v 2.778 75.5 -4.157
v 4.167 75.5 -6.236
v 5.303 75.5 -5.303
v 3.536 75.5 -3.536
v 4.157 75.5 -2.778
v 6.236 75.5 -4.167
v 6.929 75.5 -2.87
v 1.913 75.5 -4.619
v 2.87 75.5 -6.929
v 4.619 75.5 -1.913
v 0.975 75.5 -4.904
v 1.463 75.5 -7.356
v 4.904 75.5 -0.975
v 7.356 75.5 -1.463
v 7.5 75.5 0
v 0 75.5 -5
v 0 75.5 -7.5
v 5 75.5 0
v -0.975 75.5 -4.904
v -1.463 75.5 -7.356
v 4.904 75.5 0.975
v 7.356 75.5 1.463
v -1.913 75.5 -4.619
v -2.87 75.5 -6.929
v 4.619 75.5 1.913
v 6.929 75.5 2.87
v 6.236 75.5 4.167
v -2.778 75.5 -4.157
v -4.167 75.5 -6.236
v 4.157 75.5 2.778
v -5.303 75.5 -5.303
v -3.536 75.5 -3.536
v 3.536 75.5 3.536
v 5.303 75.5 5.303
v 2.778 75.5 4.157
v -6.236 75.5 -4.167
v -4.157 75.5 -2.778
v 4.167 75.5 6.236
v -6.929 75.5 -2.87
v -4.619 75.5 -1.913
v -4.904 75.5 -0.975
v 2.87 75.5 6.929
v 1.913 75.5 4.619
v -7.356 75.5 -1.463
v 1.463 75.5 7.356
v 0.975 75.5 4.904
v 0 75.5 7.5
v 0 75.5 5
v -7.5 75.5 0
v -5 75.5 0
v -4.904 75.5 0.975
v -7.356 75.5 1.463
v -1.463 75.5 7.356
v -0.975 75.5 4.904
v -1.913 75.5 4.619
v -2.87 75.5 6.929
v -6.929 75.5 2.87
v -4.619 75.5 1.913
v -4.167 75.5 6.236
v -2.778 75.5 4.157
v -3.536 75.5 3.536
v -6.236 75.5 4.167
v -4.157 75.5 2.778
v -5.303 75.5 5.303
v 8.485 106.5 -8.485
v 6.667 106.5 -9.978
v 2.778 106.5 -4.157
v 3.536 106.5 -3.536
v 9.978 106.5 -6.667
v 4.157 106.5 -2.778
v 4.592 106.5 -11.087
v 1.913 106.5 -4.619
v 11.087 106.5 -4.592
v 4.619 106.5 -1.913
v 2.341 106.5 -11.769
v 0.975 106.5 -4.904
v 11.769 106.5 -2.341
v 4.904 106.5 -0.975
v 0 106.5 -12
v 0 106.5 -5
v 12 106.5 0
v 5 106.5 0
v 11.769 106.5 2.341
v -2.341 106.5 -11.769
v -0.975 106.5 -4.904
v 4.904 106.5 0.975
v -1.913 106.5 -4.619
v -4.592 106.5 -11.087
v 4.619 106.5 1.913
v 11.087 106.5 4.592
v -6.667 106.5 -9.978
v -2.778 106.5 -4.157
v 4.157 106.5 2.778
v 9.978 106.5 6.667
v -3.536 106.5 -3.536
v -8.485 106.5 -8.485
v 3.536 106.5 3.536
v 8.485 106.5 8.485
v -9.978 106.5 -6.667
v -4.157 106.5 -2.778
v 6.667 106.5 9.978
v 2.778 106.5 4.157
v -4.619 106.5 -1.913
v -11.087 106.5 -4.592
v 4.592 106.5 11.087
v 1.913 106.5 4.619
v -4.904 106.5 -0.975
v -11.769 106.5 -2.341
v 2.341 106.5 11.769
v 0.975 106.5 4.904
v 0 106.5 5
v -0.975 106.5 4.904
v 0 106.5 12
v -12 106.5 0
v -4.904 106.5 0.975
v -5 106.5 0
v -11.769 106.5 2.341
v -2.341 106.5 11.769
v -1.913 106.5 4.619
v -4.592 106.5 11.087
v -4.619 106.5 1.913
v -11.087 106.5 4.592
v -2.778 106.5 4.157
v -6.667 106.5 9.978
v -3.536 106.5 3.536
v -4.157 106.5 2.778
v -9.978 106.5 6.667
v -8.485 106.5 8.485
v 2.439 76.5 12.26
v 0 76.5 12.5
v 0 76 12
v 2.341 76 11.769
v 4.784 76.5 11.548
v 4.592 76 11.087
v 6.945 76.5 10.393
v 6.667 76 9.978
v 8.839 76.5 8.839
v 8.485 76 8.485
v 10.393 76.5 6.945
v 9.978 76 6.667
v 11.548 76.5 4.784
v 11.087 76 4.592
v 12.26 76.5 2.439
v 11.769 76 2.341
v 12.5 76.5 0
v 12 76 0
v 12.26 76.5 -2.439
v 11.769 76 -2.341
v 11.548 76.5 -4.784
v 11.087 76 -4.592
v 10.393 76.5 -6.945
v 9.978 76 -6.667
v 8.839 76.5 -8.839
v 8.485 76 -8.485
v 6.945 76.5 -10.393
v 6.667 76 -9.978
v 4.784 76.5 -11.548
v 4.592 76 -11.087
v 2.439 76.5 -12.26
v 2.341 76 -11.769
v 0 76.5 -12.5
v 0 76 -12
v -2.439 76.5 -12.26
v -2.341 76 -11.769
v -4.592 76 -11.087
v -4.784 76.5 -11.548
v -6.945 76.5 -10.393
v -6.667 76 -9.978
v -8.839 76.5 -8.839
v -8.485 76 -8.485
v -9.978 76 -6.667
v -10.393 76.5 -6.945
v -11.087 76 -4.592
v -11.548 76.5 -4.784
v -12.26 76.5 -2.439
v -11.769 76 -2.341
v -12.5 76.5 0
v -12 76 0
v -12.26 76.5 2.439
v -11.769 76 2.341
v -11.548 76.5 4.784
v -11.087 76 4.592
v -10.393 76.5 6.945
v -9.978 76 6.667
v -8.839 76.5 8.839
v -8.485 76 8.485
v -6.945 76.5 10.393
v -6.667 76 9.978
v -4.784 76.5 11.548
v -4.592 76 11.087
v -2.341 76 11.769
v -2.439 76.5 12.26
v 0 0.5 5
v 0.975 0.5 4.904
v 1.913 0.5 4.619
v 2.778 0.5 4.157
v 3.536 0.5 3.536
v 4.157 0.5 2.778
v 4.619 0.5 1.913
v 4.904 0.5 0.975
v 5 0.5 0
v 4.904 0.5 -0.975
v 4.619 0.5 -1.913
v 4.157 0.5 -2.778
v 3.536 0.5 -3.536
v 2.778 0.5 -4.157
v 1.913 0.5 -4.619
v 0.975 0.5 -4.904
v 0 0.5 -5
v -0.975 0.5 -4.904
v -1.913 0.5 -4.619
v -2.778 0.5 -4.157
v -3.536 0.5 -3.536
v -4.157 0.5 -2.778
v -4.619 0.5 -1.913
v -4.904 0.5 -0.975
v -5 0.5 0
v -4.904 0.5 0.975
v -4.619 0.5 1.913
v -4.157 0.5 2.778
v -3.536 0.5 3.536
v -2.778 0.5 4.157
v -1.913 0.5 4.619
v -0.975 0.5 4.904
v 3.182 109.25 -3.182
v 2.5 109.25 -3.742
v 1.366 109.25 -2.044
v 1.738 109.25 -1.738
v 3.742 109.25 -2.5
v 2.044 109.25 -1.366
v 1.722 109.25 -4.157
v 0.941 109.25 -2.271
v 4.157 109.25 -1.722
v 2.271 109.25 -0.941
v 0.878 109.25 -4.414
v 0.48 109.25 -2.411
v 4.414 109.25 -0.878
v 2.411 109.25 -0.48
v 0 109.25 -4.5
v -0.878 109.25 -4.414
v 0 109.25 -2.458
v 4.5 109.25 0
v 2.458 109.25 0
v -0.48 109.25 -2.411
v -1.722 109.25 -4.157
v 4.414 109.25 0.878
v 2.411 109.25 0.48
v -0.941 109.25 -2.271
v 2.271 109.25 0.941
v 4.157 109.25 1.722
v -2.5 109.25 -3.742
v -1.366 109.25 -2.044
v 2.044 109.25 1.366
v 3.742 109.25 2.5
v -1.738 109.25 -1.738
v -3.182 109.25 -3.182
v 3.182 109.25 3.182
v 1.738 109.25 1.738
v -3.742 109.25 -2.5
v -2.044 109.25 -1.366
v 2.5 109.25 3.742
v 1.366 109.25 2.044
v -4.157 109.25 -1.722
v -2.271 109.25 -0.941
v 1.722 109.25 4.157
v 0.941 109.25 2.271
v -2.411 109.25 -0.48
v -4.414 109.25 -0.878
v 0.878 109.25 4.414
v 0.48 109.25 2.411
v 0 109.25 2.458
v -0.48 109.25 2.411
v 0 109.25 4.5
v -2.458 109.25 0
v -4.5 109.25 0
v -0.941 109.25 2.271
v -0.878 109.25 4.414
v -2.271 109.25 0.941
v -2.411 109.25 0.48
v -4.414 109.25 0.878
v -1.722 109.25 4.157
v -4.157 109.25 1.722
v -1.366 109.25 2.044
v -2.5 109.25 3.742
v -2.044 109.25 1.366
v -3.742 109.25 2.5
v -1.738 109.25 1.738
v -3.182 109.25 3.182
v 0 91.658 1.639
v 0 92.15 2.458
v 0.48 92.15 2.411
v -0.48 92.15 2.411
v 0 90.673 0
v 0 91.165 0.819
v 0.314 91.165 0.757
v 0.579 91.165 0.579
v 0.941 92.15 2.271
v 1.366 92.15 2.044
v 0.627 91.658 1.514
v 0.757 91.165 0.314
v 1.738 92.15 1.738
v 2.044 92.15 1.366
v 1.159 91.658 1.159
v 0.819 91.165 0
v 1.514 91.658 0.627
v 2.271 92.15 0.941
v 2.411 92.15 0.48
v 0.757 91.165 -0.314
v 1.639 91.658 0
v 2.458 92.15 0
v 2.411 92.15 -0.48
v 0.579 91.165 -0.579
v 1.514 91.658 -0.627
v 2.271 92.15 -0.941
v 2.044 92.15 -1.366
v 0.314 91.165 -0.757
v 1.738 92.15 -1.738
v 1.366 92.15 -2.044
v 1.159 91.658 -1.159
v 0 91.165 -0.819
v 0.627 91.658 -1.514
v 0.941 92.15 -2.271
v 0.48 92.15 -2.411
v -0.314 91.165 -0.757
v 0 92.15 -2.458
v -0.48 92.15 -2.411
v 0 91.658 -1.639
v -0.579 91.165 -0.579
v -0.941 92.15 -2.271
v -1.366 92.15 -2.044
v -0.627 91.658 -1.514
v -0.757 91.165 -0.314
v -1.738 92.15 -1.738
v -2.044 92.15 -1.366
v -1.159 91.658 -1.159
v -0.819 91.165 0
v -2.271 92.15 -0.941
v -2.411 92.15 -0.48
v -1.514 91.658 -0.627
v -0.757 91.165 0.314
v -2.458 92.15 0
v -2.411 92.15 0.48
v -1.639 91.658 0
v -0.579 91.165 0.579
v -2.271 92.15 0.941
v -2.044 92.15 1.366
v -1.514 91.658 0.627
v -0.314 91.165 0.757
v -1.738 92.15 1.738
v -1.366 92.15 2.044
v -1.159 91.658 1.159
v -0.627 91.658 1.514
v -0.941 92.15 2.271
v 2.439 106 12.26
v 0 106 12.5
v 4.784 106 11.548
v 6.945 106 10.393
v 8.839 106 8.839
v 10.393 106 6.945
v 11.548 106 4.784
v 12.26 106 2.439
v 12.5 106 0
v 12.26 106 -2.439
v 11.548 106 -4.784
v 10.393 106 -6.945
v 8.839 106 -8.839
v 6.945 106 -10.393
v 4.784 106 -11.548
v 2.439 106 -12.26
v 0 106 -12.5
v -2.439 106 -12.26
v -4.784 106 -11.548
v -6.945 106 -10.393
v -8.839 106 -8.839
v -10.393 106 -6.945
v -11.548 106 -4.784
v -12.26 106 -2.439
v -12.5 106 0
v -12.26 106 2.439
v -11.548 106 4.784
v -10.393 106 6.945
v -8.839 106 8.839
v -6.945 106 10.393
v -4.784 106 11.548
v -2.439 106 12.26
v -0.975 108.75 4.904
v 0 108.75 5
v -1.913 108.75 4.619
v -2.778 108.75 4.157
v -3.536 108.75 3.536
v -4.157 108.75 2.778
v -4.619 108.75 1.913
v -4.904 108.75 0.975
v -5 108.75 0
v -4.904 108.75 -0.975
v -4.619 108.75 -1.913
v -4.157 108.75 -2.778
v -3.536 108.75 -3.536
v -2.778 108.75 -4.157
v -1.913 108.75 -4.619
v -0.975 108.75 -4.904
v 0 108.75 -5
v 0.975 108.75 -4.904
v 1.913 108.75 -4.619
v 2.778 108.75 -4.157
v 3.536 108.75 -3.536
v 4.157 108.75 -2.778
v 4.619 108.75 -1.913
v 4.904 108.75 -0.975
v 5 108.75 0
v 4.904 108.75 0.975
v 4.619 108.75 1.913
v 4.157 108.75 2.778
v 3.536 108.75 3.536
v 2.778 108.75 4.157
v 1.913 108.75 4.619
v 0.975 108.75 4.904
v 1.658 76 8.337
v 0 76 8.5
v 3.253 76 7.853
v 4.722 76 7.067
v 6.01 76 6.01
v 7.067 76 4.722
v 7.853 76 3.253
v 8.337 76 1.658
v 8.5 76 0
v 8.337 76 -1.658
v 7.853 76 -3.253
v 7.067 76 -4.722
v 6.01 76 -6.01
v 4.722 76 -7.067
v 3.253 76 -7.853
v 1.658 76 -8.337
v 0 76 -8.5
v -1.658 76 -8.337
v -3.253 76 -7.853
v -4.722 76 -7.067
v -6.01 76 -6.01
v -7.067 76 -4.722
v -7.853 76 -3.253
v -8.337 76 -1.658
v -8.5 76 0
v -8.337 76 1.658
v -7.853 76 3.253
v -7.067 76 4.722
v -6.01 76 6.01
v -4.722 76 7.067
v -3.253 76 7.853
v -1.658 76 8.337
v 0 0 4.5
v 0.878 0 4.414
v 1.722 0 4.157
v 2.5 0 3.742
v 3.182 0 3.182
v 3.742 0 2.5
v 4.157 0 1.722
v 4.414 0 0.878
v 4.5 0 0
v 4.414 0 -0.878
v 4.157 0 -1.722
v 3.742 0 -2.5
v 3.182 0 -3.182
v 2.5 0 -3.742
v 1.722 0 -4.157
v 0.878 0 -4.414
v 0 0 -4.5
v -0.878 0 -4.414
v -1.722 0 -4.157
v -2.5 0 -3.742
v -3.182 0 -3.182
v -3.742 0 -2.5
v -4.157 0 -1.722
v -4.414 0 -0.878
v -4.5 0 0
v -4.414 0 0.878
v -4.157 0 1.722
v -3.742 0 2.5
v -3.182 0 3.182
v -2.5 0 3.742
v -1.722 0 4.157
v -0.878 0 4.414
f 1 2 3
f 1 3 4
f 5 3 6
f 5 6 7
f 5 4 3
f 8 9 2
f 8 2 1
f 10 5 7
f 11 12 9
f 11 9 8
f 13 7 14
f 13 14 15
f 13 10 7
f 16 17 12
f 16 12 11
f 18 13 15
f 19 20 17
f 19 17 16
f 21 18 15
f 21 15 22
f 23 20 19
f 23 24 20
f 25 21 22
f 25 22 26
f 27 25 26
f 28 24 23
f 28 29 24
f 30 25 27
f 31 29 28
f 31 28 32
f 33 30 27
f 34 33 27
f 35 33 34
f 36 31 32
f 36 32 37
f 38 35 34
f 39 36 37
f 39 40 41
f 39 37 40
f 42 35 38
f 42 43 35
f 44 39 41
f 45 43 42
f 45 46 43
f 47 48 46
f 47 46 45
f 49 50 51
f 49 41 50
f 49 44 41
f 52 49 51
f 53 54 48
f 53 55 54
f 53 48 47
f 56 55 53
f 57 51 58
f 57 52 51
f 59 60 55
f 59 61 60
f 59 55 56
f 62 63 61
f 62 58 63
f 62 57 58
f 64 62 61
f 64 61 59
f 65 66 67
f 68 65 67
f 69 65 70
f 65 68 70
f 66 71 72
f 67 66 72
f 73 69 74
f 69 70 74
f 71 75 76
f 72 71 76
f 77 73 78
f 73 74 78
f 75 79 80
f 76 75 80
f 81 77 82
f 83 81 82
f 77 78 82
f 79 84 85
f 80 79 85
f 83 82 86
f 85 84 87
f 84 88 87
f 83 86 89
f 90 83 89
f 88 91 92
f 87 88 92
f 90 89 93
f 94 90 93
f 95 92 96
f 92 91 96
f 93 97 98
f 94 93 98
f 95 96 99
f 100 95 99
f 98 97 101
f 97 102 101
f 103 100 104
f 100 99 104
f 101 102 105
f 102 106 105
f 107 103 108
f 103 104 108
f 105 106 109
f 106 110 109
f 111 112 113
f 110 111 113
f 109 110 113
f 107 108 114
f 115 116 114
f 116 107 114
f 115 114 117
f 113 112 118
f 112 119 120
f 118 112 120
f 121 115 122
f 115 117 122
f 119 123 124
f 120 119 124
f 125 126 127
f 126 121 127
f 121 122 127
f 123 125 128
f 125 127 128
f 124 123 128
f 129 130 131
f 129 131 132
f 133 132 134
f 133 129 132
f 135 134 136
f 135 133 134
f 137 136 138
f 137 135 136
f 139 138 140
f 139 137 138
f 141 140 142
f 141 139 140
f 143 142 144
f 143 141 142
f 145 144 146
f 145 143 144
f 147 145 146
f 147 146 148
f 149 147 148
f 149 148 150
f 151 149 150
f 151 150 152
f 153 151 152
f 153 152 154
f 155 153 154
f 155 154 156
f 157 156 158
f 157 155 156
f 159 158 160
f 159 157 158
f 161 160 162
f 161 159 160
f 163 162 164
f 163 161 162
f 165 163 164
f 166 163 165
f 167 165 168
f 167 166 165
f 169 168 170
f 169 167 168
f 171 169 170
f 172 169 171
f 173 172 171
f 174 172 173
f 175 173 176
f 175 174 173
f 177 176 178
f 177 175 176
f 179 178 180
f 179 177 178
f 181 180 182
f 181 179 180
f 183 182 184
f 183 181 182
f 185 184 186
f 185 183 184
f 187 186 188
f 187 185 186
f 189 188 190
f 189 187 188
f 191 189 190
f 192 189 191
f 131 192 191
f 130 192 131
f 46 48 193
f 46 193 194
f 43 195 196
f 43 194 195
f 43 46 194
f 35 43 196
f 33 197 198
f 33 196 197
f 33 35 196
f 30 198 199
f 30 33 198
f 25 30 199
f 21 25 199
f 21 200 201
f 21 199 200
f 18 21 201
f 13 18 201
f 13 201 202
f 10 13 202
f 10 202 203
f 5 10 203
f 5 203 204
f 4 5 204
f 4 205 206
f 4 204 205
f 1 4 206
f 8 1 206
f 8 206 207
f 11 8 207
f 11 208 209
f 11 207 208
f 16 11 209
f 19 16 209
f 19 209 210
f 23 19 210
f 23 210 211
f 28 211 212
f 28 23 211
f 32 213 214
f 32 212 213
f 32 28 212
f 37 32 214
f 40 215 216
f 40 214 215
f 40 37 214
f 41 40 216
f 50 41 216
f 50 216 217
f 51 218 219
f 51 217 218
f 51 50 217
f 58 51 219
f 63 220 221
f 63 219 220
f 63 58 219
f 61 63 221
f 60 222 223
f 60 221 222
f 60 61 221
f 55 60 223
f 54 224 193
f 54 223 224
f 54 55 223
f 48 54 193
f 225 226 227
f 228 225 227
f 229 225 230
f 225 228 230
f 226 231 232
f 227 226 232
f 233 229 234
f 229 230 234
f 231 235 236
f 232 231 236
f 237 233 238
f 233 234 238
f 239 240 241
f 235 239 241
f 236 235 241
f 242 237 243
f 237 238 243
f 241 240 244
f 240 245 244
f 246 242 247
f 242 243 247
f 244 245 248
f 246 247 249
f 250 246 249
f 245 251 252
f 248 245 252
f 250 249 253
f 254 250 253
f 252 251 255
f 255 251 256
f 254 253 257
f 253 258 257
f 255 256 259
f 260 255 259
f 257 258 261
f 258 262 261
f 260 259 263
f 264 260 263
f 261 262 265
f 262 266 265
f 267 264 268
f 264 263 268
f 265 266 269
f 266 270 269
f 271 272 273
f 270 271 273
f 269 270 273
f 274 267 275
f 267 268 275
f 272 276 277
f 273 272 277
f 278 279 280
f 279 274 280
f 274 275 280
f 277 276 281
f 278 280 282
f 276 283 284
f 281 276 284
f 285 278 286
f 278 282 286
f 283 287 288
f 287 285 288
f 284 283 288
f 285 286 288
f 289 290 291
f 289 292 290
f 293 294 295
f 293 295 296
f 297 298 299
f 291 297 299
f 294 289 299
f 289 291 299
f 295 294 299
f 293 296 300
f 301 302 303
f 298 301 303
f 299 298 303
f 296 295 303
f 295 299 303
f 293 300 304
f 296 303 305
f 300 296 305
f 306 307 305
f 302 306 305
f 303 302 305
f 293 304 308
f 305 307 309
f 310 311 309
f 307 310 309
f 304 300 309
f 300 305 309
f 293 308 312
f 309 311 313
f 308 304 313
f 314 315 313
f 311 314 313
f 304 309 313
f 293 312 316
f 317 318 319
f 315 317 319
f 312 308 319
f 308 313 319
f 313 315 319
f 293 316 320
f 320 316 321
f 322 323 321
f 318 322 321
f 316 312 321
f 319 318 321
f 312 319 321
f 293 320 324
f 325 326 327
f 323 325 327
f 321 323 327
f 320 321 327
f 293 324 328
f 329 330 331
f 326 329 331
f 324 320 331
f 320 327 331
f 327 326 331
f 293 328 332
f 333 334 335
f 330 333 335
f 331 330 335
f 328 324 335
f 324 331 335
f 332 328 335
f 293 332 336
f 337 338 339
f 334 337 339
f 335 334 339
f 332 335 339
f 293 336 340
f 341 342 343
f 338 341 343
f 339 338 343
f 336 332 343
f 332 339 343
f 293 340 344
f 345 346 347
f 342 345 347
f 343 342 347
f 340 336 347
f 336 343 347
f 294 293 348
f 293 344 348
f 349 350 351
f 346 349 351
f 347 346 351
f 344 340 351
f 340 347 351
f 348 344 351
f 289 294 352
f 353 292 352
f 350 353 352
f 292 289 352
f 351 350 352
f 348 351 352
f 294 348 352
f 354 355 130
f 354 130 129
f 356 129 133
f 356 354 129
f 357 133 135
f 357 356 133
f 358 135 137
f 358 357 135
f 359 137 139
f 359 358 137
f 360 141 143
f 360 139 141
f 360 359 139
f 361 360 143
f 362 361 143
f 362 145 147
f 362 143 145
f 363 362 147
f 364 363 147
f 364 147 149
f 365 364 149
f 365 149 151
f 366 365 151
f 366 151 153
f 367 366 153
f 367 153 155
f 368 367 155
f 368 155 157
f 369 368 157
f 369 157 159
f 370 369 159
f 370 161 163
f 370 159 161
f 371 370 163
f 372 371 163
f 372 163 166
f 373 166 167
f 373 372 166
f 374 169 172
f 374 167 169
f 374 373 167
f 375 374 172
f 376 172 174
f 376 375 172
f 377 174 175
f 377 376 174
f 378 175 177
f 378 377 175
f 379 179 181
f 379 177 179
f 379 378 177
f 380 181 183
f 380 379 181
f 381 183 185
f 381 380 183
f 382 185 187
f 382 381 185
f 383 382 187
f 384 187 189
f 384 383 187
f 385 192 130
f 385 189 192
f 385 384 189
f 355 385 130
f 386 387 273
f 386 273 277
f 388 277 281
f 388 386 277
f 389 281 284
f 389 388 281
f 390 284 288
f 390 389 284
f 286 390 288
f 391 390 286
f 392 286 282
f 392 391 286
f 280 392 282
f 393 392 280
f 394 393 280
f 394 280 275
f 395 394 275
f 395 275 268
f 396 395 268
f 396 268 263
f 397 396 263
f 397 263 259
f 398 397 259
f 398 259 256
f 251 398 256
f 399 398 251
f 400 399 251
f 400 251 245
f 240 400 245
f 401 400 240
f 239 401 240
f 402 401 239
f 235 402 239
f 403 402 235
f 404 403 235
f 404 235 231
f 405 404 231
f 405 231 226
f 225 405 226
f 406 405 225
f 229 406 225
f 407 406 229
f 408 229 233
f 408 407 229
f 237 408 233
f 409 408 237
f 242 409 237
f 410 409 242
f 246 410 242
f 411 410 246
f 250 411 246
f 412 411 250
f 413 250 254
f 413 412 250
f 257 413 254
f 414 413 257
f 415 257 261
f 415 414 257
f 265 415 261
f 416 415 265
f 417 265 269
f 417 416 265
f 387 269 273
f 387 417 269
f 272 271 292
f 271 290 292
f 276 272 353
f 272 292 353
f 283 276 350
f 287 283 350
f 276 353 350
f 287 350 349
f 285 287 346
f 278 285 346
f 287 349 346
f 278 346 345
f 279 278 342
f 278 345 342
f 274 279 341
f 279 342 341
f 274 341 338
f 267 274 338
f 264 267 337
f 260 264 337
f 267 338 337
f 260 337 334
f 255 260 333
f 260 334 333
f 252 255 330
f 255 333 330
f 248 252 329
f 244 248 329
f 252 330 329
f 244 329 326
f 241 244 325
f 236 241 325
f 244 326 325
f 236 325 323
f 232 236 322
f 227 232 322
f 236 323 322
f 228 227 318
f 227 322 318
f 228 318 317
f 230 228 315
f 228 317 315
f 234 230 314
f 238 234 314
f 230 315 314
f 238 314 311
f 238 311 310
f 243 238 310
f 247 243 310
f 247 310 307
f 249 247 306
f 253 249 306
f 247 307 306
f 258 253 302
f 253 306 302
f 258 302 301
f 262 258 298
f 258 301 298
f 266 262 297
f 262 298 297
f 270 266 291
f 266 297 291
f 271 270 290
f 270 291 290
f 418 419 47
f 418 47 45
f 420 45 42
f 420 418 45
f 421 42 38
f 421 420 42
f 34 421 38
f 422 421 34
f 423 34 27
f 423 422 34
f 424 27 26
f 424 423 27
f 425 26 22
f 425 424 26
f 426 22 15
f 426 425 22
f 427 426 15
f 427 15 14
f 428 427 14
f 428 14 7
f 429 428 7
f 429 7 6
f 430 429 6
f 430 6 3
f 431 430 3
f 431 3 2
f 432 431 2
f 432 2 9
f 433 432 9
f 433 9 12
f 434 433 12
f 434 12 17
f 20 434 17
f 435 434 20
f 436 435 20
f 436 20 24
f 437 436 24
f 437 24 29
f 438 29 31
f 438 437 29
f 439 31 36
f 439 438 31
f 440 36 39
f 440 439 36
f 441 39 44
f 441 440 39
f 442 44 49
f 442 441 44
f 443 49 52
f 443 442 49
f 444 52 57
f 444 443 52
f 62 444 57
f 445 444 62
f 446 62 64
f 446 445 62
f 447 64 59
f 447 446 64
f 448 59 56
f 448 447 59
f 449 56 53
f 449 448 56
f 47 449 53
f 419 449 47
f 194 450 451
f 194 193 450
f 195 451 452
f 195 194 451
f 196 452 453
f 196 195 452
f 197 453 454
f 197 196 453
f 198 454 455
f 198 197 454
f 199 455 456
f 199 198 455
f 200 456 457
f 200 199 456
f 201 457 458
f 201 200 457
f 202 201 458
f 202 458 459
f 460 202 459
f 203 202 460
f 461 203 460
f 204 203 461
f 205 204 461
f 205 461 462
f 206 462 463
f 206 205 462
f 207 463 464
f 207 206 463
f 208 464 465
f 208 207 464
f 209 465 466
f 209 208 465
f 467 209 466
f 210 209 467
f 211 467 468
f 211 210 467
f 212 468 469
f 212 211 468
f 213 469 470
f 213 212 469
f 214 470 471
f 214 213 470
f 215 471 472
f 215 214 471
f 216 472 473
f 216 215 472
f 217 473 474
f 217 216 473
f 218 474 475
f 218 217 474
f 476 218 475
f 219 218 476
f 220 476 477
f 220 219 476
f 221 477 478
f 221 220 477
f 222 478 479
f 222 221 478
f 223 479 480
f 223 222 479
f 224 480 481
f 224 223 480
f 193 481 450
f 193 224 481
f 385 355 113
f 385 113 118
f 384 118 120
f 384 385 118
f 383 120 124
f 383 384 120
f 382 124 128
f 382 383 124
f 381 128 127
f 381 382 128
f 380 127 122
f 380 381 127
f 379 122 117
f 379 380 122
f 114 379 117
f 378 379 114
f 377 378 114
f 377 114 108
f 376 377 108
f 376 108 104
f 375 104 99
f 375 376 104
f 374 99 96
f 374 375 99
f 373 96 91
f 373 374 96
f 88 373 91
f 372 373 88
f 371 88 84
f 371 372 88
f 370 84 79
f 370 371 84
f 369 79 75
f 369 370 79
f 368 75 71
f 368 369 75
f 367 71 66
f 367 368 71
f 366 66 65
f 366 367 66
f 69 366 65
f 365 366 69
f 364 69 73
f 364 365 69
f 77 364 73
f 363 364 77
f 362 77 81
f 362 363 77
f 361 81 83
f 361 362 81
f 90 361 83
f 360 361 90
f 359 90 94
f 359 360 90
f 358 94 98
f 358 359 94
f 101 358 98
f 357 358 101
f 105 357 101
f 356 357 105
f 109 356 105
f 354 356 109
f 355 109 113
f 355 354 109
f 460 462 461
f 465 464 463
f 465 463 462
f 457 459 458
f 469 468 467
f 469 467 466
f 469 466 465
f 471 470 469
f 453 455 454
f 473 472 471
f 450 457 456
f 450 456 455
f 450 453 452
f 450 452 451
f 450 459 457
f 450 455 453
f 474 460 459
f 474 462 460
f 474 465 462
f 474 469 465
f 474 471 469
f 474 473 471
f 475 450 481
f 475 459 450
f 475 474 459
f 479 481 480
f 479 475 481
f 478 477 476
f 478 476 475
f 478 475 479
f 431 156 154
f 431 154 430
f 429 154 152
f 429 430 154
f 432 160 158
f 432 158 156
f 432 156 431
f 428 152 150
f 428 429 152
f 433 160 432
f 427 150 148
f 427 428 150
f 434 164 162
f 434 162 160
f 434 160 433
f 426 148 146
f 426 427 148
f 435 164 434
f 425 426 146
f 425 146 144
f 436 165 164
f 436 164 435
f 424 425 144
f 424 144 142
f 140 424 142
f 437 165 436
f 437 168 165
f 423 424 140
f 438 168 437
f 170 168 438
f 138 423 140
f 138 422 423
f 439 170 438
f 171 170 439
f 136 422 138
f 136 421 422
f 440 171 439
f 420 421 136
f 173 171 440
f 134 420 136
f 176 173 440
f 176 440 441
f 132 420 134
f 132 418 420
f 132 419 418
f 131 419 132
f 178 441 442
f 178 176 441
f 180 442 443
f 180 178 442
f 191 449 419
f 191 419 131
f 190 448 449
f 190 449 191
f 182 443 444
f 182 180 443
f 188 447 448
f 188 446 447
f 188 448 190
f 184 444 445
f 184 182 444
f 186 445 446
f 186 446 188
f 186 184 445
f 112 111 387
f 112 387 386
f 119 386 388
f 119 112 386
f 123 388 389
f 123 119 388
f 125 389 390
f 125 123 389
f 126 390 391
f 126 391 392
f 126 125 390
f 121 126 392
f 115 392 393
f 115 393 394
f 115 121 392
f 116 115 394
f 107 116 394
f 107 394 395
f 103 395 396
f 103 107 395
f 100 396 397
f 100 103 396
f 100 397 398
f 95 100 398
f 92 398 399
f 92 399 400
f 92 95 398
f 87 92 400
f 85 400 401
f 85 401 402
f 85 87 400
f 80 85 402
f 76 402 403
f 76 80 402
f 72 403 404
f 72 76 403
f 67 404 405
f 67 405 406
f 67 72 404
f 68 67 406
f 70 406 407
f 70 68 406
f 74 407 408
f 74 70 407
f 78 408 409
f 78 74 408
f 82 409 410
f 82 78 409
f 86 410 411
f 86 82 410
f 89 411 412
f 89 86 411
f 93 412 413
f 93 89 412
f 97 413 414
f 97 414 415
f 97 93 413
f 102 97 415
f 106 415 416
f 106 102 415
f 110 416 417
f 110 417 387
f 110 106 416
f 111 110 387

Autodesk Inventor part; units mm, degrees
ref_plane "YZ Plane" through (0, 0, 0) normal (1, 0, 0) x (0, 1, 0)
ref_plane "XZ Plane" through (0, 0, 0) normal (0, 1, 0) x (-1, 0, 0)
ref_plane "XY Plane" through (0, 0, 0) normal (0, 0, 1) x (1, 0, 0)
sketch "Esquisse1" plane through (0, 0, 0) normal (1, 0, 0) x (0, 1, 0)
  line L0 (2.5227, 0) -> (-2.5227, 0)
  line L1 (0, 5) -> (75.5, 5)
  line L2 (76, 8.5) -> (76, 12)
  line L3 (76, 12) -> (76.5, 12.5)
  line L4 (76.5, 12.5) -> (106, 12.5)
  line L5 (0, 5) -> (0, 0)
  line L6 (0, 0) -> (109.25, 0)
  line L7 (106.5, 5) -> (106.5, 12)
  line L8 (106, 12.5) -> (106.5, 12)
  line L9 (76, 8.5) -> (75.5, 7.5)
  line L10 (75.5, 7.5) -> (75.5, 5)
  line L11 (109.25, 0) -> (109.25, 4.5)
  line L12 (109.25, 4.5) -> (108.75, 5)
  line L13 (108.75, 5) -> (106.5, 5)
  dimension "d2" = 0.5
  dimension "d3" = 0.5
  dimension "d6" = 10
  dimension "d7" = 76
  dimension "d8" = 25
  dimension "d9" = 0.5
  dimension "d10" = 0.5
  dimension "d11" = 30.5
  dimension "d13" = 1
  dimension "d14" = 0.5
  dimension "d15" = 17
  dimension "d23" = 0.5
  dimension "d24" = 0.5
  dimension "d25" = 10
  dimension "d26" = 2.75
revolve "Révolution1" add sketch "Esquisse1" angle 360 about axis through (0, 2.5227, 0) along (0, -1, 0)
thread "Filetage2" size "M10x1.5" class "6g" standard "ISO Metric profile" length 20
chamfer "Chanfrein1" distance 0.5 angle 45 1 edges at (0, 0, -5)
sketch "Esquisse4" plane through (0, 109.25, 0) normal (0, 1, 0) x (1, 0, 0)
  circle A0 centre (0, 0) radius 4.5 projected
  point P0 (0, 0)
hole "Perçage2" at (0, 109.25, 0) direction (0, -1, 0) diameter 4.917 depth 17.1 tip angle 118 thread size "M6x1" class "6H" standard "ISO Metric profile"
equation "\"d3\" = d2"
equation "\"d10\" = d9"
equation "\"d24\" = d23"
properties part number "axe_rotation_principal"
